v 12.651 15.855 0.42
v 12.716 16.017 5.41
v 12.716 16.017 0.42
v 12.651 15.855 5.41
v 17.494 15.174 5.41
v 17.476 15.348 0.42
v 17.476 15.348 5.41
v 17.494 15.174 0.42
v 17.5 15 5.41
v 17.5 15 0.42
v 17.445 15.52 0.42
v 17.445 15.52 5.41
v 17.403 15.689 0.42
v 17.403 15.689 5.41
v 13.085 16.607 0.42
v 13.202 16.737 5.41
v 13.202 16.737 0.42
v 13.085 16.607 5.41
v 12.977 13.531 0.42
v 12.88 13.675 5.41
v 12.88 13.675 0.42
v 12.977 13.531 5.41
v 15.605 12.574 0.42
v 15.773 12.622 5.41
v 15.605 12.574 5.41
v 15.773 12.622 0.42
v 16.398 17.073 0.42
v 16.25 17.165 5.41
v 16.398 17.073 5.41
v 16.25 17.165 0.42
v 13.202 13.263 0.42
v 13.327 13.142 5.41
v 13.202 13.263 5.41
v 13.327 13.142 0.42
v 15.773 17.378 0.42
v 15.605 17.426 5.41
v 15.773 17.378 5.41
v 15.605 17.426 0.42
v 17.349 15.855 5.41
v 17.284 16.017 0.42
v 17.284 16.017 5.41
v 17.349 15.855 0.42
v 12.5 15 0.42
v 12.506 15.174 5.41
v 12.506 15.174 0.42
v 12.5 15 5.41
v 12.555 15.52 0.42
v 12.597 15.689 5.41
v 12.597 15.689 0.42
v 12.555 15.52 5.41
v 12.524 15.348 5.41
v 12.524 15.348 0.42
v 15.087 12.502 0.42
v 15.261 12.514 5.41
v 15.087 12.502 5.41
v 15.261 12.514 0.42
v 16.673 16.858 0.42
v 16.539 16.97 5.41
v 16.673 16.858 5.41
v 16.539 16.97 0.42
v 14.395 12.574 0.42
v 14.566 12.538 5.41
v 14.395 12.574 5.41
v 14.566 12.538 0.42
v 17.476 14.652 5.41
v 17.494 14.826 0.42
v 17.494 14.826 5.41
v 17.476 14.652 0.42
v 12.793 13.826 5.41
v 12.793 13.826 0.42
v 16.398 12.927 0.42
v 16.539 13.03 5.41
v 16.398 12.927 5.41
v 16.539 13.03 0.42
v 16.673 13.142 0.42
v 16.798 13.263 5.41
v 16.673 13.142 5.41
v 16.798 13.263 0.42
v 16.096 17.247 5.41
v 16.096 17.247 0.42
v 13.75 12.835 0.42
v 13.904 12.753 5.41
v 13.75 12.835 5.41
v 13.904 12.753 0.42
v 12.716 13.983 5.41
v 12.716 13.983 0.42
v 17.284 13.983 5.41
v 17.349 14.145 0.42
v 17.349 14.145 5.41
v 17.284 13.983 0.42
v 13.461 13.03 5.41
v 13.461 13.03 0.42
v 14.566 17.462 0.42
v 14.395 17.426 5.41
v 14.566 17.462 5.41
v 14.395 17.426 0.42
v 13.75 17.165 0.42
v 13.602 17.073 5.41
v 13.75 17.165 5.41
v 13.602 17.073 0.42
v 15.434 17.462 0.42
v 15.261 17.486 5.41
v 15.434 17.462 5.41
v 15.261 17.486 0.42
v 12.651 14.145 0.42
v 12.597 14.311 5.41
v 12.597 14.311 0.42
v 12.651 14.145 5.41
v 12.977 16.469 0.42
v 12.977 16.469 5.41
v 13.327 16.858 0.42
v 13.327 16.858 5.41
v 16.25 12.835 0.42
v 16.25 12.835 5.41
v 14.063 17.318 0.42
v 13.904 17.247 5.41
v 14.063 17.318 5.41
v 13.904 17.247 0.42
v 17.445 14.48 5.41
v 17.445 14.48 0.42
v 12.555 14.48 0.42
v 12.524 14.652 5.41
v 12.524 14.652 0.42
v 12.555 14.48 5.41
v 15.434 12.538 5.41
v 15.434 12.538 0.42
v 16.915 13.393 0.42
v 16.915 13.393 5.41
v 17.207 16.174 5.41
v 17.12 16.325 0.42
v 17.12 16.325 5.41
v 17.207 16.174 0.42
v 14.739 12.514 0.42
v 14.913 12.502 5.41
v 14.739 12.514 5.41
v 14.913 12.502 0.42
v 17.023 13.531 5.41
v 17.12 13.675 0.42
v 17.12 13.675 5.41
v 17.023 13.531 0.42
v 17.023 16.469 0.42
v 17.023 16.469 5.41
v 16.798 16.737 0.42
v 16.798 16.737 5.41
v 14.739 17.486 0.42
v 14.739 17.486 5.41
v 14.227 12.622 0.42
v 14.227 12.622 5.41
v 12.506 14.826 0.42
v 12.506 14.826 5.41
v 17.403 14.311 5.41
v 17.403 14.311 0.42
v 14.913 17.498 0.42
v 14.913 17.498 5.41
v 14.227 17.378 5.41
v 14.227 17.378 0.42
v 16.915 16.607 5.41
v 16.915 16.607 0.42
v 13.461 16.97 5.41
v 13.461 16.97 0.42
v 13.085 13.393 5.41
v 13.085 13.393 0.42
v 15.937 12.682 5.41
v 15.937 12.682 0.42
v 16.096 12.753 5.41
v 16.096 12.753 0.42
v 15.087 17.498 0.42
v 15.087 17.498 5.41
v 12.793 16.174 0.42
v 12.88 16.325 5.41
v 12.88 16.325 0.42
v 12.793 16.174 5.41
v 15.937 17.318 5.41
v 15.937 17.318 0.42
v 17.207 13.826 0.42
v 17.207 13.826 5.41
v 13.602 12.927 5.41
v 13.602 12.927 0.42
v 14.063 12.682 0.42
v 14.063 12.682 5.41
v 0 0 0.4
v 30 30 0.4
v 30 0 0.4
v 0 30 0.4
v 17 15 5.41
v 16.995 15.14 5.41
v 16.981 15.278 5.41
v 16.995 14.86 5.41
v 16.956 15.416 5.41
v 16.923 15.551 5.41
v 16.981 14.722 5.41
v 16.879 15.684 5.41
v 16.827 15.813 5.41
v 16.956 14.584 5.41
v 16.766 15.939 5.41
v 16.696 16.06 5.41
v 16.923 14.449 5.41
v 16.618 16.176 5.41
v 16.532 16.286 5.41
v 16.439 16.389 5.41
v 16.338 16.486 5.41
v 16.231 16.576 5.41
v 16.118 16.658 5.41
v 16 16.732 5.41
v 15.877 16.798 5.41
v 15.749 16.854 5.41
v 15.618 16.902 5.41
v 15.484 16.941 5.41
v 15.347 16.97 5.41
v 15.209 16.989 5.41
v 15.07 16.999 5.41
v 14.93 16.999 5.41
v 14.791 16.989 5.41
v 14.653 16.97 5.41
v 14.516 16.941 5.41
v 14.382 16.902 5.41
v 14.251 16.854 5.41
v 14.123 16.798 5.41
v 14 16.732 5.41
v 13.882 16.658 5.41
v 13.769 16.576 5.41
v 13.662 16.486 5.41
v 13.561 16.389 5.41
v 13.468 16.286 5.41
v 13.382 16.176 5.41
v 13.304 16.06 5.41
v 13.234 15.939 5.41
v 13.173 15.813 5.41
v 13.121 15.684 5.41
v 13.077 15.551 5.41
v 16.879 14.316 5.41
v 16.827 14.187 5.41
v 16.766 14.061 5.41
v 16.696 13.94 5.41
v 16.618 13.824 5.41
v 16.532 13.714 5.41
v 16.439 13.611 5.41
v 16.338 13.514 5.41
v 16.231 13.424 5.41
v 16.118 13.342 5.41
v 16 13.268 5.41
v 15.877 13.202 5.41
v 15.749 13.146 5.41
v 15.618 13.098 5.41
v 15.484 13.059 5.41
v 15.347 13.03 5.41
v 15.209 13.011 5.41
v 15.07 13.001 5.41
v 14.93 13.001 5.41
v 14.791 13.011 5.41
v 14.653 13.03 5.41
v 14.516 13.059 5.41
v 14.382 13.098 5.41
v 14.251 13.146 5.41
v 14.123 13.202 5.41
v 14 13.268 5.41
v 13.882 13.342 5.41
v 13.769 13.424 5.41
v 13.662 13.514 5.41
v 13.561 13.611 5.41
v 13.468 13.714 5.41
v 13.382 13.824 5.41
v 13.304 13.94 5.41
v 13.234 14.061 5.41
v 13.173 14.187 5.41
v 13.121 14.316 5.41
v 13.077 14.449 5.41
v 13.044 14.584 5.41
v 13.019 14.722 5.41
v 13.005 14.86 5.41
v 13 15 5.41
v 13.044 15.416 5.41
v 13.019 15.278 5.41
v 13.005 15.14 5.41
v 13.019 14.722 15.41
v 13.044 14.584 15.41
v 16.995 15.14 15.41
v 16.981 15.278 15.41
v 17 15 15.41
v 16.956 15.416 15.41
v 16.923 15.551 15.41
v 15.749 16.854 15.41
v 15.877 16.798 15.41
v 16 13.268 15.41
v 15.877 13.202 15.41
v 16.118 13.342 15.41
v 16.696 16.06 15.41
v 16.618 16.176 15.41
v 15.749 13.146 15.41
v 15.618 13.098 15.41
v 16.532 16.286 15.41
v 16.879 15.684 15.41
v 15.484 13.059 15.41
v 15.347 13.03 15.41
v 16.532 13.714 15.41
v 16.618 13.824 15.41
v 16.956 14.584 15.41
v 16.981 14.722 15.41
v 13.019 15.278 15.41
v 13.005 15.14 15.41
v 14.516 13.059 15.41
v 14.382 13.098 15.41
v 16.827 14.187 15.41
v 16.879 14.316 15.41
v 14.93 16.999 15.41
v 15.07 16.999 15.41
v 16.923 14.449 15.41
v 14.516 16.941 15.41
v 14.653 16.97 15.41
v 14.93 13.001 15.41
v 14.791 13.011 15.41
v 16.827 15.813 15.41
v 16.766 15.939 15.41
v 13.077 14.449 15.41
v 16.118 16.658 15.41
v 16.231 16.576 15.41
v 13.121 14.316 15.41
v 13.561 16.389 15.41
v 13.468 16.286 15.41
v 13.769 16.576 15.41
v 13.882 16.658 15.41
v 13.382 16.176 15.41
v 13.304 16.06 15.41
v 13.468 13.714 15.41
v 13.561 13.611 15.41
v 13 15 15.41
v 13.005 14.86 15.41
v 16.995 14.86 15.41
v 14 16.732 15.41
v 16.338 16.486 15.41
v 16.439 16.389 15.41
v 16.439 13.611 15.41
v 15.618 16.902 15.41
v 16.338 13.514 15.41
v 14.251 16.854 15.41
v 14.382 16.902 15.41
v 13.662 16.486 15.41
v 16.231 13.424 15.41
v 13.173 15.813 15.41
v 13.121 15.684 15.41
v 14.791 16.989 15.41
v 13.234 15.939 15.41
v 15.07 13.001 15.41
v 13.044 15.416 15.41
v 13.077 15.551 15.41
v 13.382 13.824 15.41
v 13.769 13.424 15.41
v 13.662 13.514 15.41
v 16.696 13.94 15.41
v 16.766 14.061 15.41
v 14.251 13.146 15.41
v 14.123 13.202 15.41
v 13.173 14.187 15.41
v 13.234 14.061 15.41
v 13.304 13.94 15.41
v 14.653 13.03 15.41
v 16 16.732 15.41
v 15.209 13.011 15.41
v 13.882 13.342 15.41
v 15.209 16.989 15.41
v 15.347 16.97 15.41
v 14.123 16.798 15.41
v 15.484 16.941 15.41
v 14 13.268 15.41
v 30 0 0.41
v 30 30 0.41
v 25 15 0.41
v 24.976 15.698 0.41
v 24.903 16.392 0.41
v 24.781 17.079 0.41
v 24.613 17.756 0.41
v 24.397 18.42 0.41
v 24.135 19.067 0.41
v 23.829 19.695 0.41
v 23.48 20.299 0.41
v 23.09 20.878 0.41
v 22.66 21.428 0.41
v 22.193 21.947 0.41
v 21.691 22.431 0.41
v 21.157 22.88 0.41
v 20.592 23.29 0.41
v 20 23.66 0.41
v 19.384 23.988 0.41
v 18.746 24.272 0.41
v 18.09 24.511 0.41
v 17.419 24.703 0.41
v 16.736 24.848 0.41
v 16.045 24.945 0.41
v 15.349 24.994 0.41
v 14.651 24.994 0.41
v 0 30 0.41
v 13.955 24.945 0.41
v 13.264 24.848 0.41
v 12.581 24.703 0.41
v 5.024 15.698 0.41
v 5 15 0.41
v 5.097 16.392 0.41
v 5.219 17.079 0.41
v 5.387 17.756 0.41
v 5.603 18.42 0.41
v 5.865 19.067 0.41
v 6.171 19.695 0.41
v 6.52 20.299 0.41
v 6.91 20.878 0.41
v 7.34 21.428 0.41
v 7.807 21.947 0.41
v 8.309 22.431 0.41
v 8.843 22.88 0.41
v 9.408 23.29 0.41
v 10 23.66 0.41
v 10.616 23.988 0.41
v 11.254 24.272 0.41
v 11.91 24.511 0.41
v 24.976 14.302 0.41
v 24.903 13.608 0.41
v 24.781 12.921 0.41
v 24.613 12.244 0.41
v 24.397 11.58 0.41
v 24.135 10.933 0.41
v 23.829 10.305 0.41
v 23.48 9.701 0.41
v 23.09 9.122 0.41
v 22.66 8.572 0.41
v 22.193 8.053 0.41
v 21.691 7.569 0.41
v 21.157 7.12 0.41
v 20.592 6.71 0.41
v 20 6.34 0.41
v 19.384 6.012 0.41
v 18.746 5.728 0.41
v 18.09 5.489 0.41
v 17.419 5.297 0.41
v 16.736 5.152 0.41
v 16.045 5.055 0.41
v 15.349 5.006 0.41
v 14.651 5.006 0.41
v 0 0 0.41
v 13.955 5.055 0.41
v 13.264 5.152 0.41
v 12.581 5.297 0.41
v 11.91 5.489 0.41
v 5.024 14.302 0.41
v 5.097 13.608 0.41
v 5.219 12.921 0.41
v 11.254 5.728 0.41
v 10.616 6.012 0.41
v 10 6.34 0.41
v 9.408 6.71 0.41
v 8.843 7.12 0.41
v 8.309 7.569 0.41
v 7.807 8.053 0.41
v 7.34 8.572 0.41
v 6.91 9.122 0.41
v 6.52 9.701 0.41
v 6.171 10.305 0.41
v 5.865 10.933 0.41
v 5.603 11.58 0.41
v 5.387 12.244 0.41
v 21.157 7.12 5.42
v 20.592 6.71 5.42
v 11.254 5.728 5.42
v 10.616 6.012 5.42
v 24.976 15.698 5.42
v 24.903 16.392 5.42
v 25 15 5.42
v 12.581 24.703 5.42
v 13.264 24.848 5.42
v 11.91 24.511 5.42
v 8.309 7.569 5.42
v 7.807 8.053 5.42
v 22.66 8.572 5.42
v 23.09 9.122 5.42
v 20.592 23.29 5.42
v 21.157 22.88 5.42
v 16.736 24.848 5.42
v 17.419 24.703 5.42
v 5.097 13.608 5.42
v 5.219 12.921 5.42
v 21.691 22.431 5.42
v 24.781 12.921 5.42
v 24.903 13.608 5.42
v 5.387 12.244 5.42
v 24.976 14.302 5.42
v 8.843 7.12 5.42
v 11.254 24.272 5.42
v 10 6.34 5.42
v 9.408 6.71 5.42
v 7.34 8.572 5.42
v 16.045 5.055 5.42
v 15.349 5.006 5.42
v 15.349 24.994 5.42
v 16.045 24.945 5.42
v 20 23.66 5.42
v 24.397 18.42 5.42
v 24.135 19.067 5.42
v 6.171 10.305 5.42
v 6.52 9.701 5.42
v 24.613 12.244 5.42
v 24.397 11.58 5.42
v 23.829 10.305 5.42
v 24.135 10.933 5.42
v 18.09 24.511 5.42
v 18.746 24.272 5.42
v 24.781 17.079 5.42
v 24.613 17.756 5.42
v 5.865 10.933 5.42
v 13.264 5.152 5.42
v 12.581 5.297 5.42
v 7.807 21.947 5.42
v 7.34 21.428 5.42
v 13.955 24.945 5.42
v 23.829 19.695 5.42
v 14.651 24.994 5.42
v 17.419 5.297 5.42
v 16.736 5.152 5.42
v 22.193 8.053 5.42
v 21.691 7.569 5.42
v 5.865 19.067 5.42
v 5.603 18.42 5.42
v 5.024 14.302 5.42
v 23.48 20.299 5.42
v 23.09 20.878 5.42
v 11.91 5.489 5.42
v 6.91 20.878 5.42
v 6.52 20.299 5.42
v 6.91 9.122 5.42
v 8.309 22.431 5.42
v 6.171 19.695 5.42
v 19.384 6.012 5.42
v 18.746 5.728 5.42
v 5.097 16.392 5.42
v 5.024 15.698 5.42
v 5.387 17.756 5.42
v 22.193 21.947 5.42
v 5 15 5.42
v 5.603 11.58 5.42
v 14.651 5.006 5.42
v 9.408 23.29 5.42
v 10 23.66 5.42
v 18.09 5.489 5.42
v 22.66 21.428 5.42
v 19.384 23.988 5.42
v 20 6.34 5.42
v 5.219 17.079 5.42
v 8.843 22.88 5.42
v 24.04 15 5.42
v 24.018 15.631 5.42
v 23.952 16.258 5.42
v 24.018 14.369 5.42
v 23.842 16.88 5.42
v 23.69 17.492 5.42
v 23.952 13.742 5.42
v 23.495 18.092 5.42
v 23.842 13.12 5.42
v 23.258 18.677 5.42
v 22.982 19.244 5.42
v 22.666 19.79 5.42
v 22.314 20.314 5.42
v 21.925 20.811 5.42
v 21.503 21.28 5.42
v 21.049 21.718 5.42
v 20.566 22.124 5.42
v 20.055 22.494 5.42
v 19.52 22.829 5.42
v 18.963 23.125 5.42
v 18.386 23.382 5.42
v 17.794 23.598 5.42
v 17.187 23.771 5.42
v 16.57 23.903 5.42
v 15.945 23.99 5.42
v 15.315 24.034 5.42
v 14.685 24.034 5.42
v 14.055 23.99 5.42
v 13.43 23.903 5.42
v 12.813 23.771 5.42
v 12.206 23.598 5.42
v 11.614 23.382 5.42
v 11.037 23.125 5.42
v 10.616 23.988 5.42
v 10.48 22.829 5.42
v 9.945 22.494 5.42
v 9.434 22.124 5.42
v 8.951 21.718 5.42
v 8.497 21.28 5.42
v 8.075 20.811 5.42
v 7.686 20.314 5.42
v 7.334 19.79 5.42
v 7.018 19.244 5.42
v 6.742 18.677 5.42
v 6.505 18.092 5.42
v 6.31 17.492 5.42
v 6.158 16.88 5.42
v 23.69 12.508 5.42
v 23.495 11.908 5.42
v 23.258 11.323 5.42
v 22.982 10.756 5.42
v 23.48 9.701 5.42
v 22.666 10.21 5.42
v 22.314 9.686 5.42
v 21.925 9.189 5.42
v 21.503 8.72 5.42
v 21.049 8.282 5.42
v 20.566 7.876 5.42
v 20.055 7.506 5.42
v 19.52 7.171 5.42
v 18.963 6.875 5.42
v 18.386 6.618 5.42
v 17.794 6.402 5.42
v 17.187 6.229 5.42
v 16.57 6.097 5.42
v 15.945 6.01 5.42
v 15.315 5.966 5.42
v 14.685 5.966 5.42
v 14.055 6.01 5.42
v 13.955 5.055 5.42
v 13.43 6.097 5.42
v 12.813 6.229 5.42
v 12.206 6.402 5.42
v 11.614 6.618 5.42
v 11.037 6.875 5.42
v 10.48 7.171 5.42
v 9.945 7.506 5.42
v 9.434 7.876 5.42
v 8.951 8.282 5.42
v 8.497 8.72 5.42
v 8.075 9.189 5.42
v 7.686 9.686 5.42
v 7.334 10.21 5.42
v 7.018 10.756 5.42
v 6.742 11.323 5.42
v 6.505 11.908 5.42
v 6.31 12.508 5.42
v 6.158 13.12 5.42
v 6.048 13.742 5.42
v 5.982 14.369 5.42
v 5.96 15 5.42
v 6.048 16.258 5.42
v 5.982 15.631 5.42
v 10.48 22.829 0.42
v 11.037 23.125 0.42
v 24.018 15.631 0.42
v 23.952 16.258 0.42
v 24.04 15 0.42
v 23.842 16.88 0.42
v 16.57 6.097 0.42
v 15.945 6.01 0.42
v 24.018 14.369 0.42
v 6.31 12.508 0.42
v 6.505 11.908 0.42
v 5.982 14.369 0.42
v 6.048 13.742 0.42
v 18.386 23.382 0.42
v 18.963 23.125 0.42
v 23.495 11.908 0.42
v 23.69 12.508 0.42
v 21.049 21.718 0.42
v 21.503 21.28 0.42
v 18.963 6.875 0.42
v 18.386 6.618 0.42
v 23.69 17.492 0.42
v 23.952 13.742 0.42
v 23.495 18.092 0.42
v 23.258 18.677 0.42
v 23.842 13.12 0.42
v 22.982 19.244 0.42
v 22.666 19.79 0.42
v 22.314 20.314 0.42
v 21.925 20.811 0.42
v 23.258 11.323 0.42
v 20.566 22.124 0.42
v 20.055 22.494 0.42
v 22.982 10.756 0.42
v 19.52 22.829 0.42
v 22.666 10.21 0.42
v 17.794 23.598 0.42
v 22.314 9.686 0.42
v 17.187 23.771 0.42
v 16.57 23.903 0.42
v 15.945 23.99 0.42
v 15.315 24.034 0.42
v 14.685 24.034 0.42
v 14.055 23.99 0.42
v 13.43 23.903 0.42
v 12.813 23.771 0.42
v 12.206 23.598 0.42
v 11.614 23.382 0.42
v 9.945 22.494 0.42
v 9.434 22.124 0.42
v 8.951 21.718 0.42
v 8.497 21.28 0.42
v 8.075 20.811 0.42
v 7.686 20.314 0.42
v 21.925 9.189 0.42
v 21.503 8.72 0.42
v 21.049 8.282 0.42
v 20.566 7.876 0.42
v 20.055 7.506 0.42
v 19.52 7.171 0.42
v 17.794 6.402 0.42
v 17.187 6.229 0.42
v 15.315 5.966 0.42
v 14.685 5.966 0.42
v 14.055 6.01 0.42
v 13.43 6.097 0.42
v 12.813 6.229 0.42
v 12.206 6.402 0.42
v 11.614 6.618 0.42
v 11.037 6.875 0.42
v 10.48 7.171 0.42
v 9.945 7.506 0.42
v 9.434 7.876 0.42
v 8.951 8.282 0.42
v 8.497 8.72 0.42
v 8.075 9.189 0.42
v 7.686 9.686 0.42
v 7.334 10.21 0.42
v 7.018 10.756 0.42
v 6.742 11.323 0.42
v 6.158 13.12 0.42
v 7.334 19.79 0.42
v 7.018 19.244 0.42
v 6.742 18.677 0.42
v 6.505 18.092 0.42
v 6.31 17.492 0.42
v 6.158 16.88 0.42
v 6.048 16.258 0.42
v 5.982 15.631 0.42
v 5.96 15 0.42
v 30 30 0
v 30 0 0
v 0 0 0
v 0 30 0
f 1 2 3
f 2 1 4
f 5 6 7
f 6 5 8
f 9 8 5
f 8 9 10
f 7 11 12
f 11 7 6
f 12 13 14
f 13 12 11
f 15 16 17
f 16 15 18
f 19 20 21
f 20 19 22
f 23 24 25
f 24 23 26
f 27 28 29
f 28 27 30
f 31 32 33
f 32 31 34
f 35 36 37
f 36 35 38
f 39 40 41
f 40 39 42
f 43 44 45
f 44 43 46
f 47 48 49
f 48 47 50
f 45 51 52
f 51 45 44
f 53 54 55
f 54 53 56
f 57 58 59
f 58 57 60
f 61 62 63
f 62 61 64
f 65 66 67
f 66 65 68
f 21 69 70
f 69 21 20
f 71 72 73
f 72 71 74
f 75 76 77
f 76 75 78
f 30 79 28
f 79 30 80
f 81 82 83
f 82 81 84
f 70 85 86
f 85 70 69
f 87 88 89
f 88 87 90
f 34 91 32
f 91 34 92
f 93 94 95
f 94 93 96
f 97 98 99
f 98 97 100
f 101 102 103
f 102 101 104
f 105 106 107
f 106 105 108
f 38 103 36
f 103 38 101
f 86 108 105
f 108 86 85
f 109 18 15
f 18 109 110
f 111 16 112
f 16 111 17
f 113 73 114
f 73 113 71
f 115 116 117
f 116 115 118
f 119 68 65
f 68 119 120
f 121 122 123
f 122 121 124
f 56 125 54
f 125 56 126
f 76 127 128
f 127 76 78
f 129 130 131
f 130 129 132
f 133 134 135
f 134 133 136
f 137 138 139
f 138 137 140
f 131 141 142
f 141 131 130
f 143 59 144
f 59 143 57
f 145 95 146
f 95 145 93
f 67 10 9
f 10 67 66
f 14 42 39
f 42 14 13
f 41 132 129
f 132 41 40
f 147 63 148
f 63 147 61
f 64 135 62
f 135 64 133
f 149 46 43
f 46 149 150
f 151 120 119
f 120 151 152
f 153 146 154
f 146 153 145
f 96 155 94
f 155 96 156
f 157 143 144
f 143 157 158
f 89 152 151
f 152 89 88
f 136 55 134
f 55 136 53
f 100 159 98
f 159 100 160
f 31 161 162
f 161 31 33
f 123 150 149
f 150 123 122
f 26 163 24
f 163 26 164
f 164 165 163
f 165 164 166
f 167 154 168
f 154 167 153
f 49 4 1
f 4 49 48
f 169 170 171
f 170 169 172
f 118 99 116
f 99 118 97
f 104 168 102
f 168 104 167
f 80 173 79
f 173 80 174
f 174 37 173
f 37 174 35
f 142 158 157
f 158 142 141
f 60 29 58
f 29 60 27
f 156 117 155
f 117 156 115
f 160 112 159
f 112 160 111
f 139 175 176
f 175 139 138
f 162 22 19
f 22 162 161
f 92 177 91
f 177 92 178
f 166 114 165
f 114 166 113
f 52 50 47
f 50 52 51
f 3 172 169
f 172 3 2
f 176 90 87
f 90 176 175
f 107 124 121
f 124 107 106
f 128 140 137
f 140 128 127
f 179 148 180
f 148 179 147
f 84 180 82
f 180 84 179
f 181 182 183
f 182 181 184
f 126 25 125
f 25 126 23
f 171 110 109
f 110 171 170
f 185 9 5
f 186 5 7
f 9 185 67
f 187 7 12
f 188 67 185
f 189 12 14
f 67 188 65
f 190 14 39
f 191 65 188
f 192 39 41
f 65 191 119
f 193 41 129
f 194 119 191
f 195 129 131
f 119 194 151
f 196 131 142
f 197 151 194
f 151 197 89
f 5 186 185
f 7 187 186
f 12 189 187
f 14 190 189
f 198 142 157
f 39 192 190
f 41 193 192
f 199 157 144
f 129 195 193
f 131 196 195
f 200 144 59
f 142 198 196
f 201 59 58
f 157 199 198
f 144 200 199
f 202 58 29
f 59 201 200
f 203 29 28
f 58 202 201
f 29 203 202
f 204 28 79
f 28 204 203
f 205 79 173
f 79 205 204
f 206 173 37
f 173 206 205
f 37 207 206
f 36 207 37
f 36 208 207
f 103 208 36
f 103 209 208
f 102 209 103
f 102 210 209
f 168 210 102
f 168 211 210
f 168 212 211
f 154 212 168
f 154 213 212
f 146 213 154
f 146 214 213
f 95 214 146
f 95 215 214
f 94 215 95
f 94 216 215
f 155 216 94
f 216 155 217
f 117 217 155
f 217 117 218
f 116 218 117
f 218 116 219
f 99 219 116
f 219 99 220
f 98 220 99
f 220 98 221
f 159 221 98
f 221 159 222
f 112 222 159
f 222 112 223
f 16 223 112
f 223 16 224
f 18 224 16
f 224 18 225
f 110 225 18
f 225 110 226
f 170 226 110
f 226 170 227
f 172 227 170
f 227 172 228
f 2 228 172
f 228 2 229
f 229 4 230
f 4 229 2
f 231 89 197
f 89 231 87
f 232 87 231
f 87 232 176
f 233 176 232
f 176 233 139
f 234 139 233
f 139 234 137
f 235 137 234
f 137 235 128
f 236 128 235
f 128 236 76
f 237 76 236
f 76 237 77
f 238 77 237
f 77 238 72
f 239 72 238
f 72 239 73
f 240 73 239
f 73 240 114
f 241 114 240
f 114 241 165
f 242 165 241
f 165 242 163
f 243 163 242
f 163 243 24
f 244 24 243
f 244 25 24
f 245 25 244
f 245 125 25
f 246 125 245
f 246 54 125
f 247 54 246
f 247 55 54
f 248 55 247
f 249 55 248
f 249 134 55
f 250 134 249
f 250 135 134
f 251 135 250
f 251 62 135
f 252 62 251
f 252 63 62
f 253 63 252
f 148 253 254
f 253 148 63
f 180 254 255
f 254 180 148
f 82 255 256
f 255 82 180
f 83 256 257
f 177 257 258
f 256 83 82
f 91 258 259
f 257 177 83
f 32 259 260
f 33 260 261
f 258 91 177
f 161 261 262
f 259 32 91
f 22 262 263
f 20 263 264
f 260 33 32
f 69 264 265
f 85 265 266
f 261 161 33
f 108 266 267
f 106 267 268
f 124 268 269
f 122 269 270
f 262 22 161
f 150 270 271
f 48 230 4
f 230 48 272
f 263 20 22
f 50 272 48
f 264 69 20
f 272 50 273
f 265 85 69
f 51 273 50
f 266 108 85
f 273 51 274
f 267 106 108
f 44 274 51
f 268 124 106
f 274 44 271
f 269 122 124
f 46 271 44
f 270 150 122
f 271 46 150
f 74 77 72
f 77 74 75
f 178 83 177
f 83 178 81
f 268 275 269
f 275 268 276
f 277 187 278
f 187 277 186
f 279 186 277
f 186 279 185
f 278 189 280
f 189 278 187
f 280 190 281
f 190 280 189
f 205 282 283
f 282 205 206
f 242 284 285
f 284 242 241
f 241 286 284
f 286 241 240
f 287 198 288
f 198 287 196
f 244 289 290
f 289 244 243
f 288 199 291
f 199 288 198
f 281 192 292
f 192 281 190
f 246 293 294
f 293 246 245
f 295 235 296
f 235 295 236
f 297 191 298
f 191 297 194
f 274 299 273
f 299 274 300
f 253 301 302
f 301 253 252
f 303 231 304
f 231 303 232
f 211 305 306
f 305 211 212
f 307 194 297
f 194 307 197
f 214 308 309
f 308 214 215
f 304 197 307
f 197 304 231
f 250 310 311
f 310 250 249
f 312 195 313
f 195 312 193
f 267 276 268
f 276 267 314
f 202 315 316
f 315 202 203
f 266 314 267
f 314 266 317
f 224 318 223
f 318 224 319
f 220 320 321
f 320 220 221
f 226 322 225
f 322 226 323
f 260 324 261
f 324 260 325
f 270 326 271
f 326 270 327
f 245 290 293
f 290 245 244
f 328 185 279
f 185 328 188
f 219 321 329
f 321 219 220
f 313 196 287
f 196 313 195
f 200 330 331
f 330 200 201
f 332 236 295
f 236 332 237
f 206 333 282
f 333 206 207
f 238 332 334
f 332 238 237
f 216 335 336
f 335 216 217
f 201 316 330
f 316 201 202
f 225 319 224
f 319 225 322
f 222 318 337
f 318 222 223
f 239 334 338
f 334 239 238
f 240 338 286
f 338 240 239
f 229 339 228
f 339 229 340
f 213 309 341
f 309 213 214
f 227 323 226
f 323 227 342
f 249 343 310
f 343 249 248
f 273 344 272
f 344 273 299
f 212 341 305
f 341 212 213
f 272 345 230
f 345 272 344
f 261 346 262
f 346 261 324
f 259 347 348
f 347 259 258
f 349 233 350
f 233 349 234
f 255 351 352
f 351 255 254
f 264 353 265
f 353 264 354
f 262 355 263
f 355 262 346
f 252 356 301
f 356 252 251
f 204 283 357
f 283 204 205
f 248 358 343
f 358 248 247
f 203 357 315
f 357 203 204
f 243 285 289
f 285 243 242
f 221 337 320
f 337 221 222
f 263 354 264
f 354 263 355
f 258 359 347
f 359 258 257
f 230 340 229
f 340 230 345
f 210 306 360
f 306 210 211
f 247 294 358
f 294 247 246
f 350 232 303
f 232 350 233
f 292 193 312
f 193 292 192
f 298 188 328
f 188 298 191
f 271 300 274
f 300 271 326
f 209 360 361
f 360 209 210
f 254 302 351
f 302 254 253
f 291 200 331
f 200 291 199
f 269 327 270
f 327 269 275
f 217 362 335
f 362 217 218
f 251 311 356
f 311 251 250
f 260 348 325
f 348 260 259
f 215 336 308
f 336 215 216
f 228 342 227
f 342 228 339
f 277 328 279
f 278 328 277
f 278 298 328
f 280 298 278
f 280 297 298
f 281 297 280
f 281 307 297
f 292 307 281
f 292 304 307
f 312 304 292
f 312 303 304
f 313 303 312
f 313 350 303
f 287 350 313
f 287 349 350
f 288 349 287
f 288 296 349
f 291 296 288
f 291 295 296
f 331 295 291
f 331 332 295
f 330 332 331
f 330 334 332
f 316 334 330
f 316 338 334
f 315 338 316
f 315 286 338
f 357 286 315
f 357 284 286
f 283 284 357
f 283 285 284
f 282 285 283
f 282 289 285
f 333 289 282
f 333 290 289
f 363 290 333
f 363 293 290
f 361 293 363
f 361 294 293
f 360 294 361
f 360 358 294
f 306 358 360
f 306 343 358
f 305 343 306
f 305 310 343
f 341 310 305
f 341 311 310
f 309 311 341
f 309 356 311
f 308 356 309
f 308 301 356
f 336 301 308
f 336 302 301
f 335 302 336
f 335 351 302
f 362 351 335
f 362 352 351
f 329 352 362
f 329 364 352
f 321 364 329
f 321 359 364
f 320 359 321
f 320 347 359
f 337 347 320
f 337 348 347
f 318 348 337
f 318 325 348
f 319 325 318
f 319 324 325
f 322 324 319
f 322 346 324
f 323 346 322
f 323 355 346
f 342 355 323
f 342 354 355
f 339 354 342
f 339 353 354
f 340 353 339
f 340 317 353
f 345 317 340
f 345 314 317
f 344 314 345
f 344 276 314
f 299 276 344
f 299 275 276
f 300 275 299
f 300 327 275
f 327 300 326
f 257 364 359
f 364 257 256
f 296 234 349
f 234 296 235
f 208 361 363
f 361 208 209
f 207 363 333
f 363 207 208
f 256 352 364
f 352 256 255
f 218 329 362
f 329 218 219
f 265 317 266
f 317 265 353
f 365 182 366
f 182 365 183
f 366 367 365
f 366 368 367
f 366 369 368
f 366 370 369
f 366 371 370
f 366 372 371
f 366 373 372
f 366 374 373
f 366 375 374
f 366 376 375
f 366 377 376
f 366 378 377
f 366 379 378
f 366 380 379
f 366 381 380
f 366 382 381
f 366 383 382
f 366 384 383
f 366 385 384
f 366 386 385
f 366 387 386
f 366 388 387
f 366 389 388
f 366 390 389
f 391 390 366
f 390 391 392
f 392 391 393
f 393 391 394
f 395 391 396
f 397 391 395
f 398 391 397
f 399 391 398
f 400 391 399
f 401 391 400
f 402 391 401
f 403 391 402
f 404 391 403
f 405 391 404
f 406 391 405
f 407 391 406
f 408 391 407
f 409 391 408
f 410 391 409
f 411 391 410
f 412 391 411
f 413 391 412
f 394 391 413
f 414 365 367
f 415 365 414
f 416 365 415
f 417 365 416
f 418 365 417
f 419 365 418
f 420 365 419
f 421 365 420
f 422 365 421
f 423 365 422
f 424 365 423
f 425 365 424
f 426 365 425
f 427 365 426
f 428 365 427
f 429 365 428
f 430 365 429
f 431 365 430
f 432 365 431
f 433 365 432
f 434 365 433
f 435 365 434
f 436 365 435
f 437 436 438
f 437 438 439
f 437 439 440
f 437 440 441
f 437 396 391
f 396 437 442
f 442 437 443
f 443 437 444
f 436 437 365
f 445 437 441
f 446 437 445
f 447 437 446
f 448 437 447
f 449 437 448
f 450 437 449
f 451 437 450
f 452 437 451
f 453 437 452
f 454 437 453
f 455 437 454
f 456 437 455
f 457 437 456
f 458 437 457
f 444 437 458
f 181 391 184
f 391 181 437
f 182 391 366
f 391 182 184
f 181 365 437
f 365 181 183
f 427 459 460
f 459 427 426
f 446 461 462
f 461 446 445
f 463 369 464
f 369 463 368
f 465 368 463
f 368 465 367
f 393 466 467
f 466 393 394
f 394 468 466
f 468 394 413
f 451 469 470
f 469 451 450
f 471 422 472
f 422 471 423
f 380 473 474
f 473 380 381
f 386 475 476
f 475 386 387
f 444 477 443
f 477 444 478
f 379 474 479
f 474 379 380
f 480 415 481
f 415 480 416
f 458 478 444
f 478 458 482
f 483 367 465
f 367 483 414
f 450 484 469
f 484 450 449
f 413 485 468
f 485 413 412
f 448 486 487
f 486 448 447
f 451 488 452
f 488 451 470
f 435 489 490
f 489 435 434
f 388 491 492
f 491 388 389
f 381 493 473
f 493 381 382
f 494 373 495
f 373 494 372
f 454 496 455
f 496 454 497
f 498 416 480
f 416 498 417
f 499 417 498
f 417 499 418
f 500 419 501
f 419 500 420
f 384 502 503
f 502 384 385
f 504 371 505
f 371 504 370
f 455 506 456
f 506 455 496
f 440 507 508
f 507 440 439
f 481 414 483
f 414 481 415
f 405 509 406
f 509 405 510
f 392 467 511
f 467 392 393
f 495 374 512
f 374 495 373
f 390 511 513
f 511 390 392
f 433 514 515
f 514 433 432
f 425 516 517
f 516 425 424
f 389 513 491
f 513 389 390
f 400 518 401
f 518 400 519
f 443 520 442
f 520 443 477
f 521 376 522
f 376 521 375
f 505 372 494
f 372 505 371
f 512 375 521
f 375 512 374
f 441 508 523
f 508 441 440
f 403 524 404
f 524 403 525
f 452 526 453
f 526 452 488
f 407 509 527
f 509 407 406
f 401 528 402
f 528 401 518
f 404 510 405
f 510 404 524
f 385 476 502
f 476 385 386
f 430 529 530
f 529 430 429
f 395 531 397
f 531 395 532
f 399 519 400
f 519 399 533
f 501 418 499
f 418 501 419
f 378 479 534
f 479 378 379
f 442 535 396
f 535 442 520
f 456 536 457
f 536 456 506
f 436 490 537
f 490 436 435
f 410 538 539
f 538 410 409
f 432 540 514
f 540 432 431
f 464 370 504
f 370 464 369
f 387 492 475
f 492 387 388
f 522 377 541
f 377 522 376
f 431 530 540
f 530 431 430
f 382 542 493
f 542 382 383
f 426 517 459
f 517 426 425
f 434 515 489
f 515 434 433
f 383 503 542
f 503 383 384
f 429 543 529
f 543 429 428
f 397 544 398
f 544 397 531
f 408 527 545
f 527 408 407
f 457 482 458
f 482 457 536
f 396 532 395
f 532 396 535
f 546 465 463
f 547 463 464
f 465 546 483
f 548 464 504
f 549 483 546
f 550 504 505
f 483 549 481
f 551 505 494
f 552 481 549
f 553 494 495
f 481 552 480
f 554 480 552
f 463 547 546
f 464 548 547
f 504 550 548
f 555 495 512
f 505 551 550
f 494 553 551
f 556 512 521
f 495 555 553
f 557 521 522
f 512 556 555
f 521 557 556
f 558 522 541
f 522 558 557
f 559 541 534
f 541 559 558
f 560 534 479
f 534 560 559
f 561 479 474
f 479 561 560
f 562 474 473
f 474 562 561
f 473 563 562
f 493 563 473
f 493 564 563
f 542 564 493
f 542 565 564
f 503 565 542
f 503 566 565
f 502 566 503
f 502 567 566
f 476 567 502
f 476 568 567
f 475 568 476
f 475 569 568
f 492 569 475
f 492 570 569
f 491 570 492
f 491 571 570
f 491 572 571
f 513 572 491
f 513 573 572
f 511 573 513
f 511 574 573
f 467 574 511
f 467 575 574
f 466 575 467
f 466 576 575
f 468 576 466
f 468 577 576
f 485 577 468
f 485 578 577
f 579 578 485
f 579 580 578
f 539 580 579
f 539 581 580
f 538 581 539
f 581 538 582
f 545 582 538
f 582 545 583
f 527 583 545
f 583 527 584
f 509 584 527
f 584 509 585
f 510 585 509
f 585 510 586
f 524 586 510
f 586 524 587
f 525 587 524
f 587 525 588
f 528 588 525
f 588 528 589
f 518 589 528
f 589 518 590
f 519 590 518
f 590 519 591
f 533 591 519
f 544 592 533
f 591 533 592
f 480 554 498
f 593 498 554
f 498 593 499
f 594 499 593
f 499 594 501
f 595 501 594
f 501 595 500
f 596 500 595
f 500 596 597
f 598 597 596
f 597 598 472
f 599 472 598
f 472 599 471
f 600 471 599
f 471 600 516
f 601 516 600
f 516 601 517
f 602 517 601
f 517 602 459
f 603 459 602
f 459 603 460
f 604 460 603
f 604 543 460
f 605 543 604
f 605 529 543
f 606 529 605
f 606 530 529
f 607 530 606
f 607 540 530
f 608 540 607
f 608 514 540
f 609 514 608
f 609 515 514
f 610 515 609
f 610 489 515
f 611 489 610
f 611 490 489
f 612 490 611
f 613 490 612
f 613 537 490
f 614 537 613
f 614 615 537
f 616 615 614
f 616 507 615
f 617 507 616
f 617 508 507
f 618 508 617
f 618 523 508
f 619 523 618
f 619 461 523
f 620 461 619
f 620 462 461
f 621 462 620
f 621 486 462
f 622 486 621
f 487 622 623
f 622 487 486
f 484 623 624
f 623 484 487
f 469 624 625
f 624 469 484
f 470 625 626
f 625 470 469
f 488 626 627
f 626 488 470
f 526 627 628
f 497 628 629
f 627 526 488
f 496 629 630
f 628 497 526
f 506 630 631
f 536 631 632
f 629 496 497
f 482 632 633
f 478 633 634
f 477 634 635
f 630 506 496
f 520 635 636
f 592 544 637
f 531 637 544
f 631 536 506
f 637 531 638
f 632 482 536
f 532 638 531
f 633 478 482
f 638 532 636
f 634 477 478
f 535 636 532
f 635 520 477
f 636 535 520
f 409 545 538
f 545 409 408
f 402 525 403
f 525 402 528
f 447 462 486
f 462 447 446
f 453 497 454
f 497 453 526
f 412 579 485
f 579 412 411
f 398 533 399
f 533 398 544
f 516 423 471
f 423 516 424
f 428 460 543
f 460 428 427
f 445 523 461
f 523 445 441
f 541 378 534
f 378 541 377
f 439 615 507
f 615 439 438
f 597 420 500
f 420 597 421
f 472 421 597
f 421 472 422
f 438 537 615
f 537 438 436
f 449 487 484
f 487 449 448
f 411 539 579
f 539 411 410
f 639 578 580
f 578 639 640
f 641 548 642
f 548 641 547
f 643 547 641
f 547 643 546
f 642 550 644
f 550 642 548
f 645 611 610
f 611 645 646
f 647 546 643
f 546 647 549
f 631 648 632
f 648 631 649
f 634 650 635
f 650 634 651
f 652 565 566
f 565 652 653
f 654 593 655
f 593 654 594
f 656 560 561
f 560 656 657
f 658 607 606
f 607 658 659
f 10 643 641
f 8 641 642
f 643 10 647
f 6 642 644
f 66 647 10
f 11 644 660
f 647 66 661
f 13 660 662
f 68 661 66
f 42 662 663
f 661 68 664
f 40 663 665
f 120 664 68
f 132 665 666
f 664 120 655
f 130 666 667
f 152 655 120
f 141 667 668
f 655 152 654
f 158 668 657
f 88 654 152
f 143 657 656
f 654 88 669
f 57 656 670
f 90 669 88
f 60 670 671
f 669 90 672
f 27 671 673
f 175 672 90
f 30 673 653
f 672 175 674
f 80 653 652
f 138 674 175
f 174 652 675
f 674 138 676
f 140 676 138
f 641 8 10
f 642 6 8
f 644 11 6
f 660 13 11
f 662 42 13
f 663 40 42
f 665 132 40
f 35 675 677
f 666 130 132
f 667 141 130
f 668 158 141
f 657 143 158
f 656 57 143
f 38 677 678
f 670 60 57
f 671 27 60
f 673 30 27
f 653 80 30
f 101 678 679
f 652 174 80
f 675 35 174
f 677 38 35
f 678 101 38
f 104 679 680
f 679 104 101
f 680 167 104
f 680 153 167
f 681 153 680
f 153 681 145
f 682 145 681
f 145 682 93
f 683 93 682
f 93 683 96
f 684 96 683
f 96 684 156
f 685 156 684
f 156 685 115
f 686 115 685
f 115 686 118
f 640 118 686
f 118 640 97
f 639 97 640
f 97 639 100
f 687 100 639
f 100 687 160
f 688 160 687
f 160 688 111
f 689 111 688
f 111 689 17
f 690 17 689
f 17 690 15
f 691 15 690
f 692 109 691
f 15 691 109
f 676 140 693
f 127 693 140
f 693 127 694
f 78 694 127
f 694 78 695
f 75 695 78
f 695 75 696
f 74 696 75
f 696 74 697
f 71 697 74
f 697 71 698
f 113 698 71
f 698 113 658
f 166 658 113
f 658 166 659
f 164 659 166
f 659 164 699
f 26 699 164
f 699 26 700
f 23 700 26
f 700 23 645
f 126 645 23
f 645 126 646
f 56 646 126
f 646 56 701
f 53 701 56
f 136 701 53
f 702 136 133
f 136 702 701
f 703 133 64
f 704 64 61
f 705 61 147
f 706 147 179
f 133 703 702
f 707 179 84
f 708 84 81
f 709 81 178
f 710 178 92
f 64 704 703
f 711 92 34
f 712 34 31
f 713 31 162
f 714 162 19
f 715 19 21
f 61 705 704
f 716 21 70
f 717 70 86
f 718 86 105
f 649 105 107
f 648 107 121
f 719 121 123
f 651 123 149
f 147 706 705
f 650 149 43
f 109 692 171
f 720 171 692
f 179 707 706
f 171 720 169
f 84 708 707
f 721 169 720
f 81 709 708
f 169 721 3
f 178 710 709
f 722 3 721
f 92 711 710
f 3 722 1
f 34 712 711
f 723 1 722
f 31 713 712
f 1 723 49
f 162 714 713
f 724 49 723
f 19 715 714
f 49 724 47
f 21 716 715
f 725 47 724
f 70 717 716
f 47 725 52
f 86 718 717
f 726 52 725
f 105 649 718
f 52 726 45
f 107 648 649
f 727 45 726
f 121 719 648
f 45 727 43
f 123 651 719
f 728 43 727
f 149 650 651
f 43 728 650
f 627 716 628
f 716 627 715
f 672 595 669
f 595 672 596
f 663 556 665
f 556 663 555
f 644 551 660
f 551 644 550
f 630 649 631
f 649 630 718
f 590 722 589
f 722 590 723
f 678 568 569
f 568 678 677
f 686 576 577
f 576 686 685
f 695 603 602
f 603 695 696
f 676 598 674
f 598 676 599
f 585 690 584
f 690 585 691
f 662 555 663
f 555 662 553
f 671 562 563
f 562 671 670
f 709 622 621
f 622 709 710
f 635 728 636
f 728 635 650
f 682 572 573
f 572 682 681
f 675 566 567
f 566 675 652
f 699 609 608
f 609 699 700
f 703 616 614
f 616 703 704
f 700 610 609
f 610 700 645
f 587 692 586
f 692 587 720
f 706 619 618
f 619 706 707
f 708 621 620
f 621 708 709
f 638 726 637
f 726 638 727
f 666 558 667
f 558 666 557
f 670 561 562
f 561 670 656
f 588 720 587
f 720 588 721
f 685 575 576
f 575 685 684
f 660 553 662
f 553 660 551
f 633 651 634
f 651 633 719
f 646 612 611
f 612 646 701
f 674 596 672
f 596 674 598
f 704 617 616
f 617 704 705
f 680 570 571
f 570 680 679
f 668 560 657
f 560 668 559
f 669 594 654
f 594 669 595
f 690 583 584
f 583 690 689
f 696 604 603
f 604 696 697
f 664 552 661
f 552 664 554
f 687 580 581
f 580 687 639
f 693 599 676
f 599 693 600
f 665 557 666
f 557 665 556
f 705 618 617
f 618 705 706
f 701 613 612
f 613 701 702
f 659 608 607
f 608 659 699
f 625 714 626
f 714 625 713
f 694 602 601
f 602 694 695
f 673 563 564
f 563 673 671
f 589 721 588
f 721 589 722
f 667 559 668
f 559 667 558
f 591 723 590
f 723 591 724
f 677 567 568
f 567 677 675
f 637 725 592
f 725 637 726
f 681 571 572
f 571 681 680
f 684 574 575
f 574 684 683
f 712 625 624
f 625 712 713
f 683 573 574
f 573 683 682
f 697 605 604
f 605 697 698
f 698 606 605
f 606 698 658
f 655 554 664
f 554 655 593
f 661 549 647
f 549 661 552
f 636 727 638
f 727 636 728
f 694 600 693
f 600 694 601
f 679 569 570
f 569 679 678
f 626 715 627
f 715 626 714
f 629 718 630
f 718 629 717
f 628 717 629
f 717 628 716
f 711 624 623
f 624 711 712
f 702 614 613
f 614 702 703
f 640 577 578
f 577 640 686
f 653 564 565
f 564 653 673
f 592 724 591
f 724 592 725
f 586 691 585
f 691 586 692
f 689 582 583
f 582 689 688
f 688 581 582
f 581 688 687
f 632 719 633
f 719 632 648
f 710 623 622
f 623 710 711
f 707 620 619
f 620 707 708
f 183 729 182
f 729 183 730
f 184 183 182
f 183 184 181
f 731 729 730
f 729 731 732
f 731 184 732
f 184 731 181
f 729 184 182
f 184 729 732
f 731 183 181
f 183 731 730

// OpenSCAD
// file: ../../Base/PlacementOptions.scad
// Fischertechnik Box Foundation
// Placement Options

// Alignment
NoAlign = 0;
AlignLeft = 1;
AlignBottom = 2;
AlignCenter = 3;
AlignRight = 4;
AlignTop = 5;

// Element rotation degree steps
rotations = [0, -90, -180, -270];

// Rotation
NoRotation = 0;
Rotate0 = 0;
Rotate90 = 1;
Rotate180 = 2;
Rotate270 = 3;

// Docking (seen from above)
NoDock = -1;
DockLeft = 0;
DockTop = 1;
DockRight = 2;
DockCorner = 2;
DockBottom = 3;

// Web corners
LowerLeft = 0;
UpperLeft = 1;
UpperRight = 2;
LowerRight = 3;

// Web position relative to corner
LeftOfCorner = 0;
RightOfCorner = 1;
// file: ../../Base/Boxes.scad
// Fischertechnik Box Foundation
// Pre-designed Boxes

use <Constants.scad>

include <PlacementOptions.scad>

box190Width = 190;
box190Depth = 130;
box130Width = 130;
box130Depth = 95;
boxUsageHeight = 33.9;
boxWallThickness = 2.4;
boxBaseThickness = 1.0;
boxWebWidth = 3.0;

// getBoxWallThickness()
// Gets the wall thickness of a Fischertechnik Box

function getBoxWallThickness() = boxWallThickness;

// Gets the usable height of a fischertechnik box
function getBoxUsageHeight() = boxUsageHeight;

// Gets the thickness of the Fischertechnik box base.
function getBoxBaseThickness() = boxBaseThickness;

// Gets the width of a box web
function getBoxWebWidth() = boxWebWidth;

// Gets the usable inner space of a Box 190 as an x/y-list
function getBox190Space() = [
    box190Width - 2*getBoxWallThickness(), 
    box190Depth - 2*getBoxWallThickness() ];

// Imports the Fischertechnik empty box 130x190 mm and places it at position 0,0
// 190x130 are the outer sizes, the inner space is slightly smaller. Use getBox190Space() to get the inner sizes.
// This module needs the STL file "Fischertechnik Box 130x190.stl" in the library path.
// The box is positioned that the usable inner space is at the 0,0,0 position. The

module Box190() {
    translate([-getBoxWallThickness(),-getBoxWallThickness(),-getBoxBaseThickness()])
        import("Fischertechnik Box 130x190.stl", convexity=3);
}

// Gets the usable inner space of a Box 130 as an x/y-list
function getBox130Space() = [
    box130Width - 2*getBoxWallThickness(), 
    box130Depth - 2*getBoxWallThickness() ];

// Imports the Fischertechnik empty box 95x130 mm and places it at position 0,0
// 190x130 are the outer sizes, the inner space is slightly smaller. Use getBox190Space() to get the inner sizes.
// This module needs the STL file "Fischertechnik Box 95x130.stl" in the library path.
// The box is positioned that the usable inner space is at the 0,0,0 position. The

module Box130() {
    translate([-getBoxWallThickness(),-getBoxWallThickness(),-getBoxBaseThickness()])
        import("Fischertechnik Box 95x130.stl", convexity=3);
}

// Creates a web at the specified box walls
// corner 0 = LowerLeft, 1 = UpperLeft, 2 = UpperRight, 3 = LowerRight
// side 0 = LeftOfCorner, 1 = RightOfCorner
// distance = Distance in mm from the corner
// box = inner width and depth of the box (default: Box 190)
// webWidth = length of the web (default is 3 mms)
// webThickness = thickness of the web (default is 1 mm)

module BoxWeb(corner, side, distance, box=getBox190Space(), webWidth=getBoxWebWidth(), webThickness=1.0) {
    sink = getBoxWallThickness()/2;

    width = (corner % 2 == 0) ? 
            (side == LeftOfCorner ? webWidth : webThickness) :
            (side == LeftOfCorner ? webThickness : webWidth);

    depth = (corner % 2 == 0) ? 
            (side == RightOfCorner ? webWidth : webThickness) :
            (side == RightOfCorner ? webThickness : webWidth);
    
    xDiff = corner == LowerLeft ? 
                (side == LeftOfCorner ? -sink : distance) :
            (corner == UpperLeft ?                
                (side == LeftOfCorner ? distance : -sink) :
            (corner == UpperRight ?
                (side == LeftOfCorner ? box.x-webWidth+sink : box.x-distance-webThickness) :
                (side == LeftOfCorner ? box.x-distance-webThickness: box.x-webWidth+sink)));

    yDiff = corner == LowerLeft ? 
                (side == RightOfCorner ? -sink : distance) :
            (corner == UpperLeft ?
                (side == RightOfCorner ? box.y-distance : box.y-webWidth+sink) :
            (corner == UpperRight ?
                (side == RightOfCorner ? box.y-webWidth+sink : box.y-distance) :
                (side == RightOfCorner ? distance : -sink)));
    
    translate([xDiff, yDiff, -getExcess()])
        cube([width, depth, boxUsageHeight + 2*getExcess()]);
}
// file: ../../Base/Rotation.scad
// Fischertechnik Box Foundation
// Geometry Helpers Rotation

include <PlacementOptions.scad>

// getRotatedSpace(space, rotation=NoRotation)
// Rotates the space dependent on the specified rotation

function getRotatedSpace(space, rotation=NoRotation) = [
    (rotation == Rotate90 || rotation == Rotate270) ? space.y : space.x,
    (rotation == Rotate90 || rotation == Rotate270) ? space.x : space.y
];

// Rotates the given space around the fixed left lower corner
// space = the space the children needs as width/depth list [width,depth]
// rotation = 0 Rotate0 degrees, 1 Rotate90 degrees, 2 Rotate180 degrees, 3 Rotate270 degrees (equivalent to -90)

module RotateFix(space, rotation=Rotate0) {
    dy = (rotation == Rotate0 || rotation == Rotate270) ? 0 :
        (rotation == Rotate90) ? space.x :
        space.y;
    dx = (rotation < Rotate180) ? 0 :
        (rotation == Rotate180) ? space.x :
        space.y;
    
    translate([dx, dy, 0])
        rotate([0, 0, rotations[rotation]])
            children();
}
// file: ../../Base/Alignment.scad
// Fischertechnik Box Foundation
// Geometry Helpers Alignment

include <PlacementOptions.scad>

// getAlignedX(elementWidth, spaceWidth, align=AlignRight, offset=0)
// Gets the aligned X offset of an element with the given
// width in the given space.
// elementWidth = The width of the element to positon
// spaceWidth = The space where the element should be aligned
// align = 0 AlignLeft, 1 AlignCenter, 2 AlignRight
// offset = an optional offset from the aligned position. When
// aligned left or centered, then positive values are in X direction.
// When aligned right then positive values are in negative X direction.

function getAlignedX(elementWidth, spaceWidth, align=AlignRight, offset=0) =
    (align == AlignLeft) ?
        offset :
        ((align == AlignCenter) ?
        (spaceWidth - elementWidth)/2 + offset :
        spaceWidth - offset - elementWidth);

// getAlignedY(elementDepth, spaceDepth, align=AlignTop, offset=0)
// Gets the aligned Y offset of an element with the given
// depth in the given space.
// elementDepth = The depth of the element to positon
// spaceDepth = The space where the element should be aligned
// align = 0 AlignBottom, 1 AlignCenter, 2 AlignTop
// offset = an optional offset from the aligned position. When
// aligned bottom or centered, then positive values are in Y direction.
// When aligned top then positive values are in negative Y direction.

function getAlignedY(elementDepth, spaceDepth, align=AlignTop, offset=0) =
    (align == AlignBottom) ?
        offset :
        ((align == AlignCenter) ?
        (spaceDepth - elementDepth)/2 + offset :
        spaceDepth - offset - elementDepth);
// file: ../../Base/Placement.scad
// Fischertechnik Box Foundation
// Geometry Helpers Placement

use <Constants.scad>
use <Alignment.scad>
use <Rotation.scad>
use <Boxes.scad>

include <PlacementOptions.scad>

// Place(x=0, y=0, elementSpace=[0,0], alignX=AlignLeft, alignY=AlignBottom, rotation=Rotate0, boxSpace=getBox190Space())
// Places the child at the specified position
// y = Y-Position. This is a relative position when an X aligment is specified.
// x = X-Position. This is a relative position when an Y aligment is specified.
// elementSpace = space of the element to be placed [x,y]
// alignX = -1=NoAlign, 0 AlignLeft, 1 AlignCenter, 3 AlignRight (elementSpace and boxSpace required!)
// alignY = -1=NoAlign, 2 AlignBottom, 1 AlignCenter, 4 AlignTop (elementSpace and boxSpace required!)
// rotation = 0 Rotate0 0 degrees, 1 Rotate90 90 degrees, 
// 2 Rotate180 180 degrees, 3 Rotate270 270 degrees (equivalent to -90)
// boxSpace = Inner space of the box where the placement occurs [x,y] - default is Box 190x130 inner space

module Place(x=0, y=0, elementSpace=[0,0], 
  alignX=AlignLeft, alignY=AlignBottom, 
  rotation=NoRotation, boxSpace=getBox190Space()) {

    module Position(x, y, space, rotation=Rotate0) {
        translate([x, y, 0])
            RotateFix(space, rotation)
                children();
    }

    space = getRotatedSpace(elementSpace, rotation);
    alignedX = getAlignedX(space.x, boxSpace.x, alignX, x);
    alignedY = getAlignedY(space.y, boxSpace.y, alignY, y);
    Position(alignedX, alignedY, elementSpace, rotation)
        children();
}

// Center(space=getBox130Space(), elementSpace=[0,0])
// space = Space where the children is centered. For cylinder use centered=true and no elementSpace.
// elementSpace = space of the element to be centered [x,y]

module Center(space=getBox190Space(), elementSpace=[0,0]) {
    translate([(space.x - elementSpace.x) / 2, (space.y - elementSpace.y) / 2])
        children(0);
}

// CenterHorizontal(width=0, y=0, offset=0, space=getBox130Space())
// space = Space where the children is centered. For cylinder use centered=true and no elementSpace.
// elementSpace = space of the element to be centered [x,y]

module CenterHorizontal(width=0, y=0, offset=0, space=getBox190Space()) {
    translate([(space.x - width) / 2 + offset, y])
        children(0);
}

// CenterVertical(depth=0, x=0, offset=0, space=getBox130Space())
// space = Space where the children is centered. For cylinder use centered=true and no elementSpace.
// elementSpace = space of the element to be centered [x,y]

module CenterVertical(depth=0, x=0, offset=0, space=getBox190Space()) {
    translate([x, (space.y - depth) / 2 + offset])
        children(0);
}
// file: ../../Elements/AxisClip10.scad
// Fischertechnik Box Library
// Axis for clip 10
// 31023

use <../ModelBase/Simple.scad>

width = 12;
depth = 12;
height = 23;

// getAxisClip10Space()
// Gets the space of a frame for a clip 10 with spring ring (mot2)

function getAxisClip10Space() = [width, depth, height];

// AxisClip10()
// Axis for clip 10 with spring ring (mot2)

module AxisClip10() {
    LeveledAxisWithSpace(height, height-10, getAxisClip10Space());
}

// Tests
color("lightgray")
AxisClip10();
// file: ../../Base/Constants.scad
// Fischertechnik Box Foundation
// Constants

// Constant values necessary for multiple elements

// Base constants
dividerThickness = 1.2;
excess = 0.01;
fragments = 90;
tolerance = 0.8;

// Gets the thickness of a divider 
function getDividerThickness() = dividerThickness;

// Gets the excess that is used to merge walls into each other
function getExcess() = excess;

// Gets amount of fragments of a cylinder
function getFragments() = fragments;

// Gets the inner tolerance of a frame to each side
function getTolerance() = tolerance;


// Fischertechnik specific constants
axisDiameter = 4;
axisBottomDiameter = axisDiameter + 1;
standardEdgeDistance = 2.5;
standardWebDistance = 11.5;
standardCornerLength = 15;
tubeWallFactor = 0.8;

// Gets axis diameter
function getAxisDiameter() = axisDiameter;

// Gets axis bottom diameter for thicker part at the bottom
function getAxisBottomDiameter() = axisBottomDiameter;

// gets the standard distance to the wall of the box for dockable frames with webs
function getStandardEdgeDistance() = standardEdgeDistance;

// gets the standard distance of each web to the corner of the dockable frame
function getStandardWebDistance() = standardWebDistance;

// gets the standard length of the corner walls of a dockable frame
function getStandardCornerLength() = standardCornerLength;

// gets the wall thickness of a tube.
function getTubeWallThickness() = tubeWallFactor * getDividerThickness();
// file: ../../Elements/AxisHub.scad
// Fischertechnik Box Library
// Axis and cylinder for hub
// 31014

use <../Base/Constants.scad>
use <../Base/Placement.scad>
use <../ModelBase/Simple.scad>

width = 30;
depth = 30;

// getAxisHubSpace()
// Gets the space the axis hub needs as width and depth (.x and .y as a list)

function getAxisHubSpace() = [width, depth];

// AxisHub()
// Axis to stick a standard hub on it. This needs
// a 30x30 mm rectangle in the box. To support the placement
// the axis has a thin and sinked 30x30 mm base plate.

module AxisHub() {
    axisHeight = 15;
    tubeHeight = 5;
    tubeDiameter = 20;

    LeveledAxisWithSpace(axisHeight, tubeHeight, getAxisHubSpace());
    
    Center(getAxisHubSpace())
        Tube(tubeHeight, outerDiameter=tubeDiameter);
}

// Tests
color("lightgray") {
AxisHub();
}
// file: ../TestPrint.scad
// 3D Print Test Base

use <../Base/Constants.scad>

use <../Elements/AxisClip10.scad>

module TestPrint(elementSpace) {
    cube([elementSpace.x, elementSpace.y, 0.4]);
    translate([0,0,0.4+getExcess()]) {
        children();
    }
}

TestPrint(getAxisClip10Space())
    AxisClip10();
// main file
// 3D Print Test
// AxisHub

use <../TestPrint.scad>
use <../../Elements/AxisHub.scad>

TestPrint(getAxisHubSpace())
    AxisHub();
